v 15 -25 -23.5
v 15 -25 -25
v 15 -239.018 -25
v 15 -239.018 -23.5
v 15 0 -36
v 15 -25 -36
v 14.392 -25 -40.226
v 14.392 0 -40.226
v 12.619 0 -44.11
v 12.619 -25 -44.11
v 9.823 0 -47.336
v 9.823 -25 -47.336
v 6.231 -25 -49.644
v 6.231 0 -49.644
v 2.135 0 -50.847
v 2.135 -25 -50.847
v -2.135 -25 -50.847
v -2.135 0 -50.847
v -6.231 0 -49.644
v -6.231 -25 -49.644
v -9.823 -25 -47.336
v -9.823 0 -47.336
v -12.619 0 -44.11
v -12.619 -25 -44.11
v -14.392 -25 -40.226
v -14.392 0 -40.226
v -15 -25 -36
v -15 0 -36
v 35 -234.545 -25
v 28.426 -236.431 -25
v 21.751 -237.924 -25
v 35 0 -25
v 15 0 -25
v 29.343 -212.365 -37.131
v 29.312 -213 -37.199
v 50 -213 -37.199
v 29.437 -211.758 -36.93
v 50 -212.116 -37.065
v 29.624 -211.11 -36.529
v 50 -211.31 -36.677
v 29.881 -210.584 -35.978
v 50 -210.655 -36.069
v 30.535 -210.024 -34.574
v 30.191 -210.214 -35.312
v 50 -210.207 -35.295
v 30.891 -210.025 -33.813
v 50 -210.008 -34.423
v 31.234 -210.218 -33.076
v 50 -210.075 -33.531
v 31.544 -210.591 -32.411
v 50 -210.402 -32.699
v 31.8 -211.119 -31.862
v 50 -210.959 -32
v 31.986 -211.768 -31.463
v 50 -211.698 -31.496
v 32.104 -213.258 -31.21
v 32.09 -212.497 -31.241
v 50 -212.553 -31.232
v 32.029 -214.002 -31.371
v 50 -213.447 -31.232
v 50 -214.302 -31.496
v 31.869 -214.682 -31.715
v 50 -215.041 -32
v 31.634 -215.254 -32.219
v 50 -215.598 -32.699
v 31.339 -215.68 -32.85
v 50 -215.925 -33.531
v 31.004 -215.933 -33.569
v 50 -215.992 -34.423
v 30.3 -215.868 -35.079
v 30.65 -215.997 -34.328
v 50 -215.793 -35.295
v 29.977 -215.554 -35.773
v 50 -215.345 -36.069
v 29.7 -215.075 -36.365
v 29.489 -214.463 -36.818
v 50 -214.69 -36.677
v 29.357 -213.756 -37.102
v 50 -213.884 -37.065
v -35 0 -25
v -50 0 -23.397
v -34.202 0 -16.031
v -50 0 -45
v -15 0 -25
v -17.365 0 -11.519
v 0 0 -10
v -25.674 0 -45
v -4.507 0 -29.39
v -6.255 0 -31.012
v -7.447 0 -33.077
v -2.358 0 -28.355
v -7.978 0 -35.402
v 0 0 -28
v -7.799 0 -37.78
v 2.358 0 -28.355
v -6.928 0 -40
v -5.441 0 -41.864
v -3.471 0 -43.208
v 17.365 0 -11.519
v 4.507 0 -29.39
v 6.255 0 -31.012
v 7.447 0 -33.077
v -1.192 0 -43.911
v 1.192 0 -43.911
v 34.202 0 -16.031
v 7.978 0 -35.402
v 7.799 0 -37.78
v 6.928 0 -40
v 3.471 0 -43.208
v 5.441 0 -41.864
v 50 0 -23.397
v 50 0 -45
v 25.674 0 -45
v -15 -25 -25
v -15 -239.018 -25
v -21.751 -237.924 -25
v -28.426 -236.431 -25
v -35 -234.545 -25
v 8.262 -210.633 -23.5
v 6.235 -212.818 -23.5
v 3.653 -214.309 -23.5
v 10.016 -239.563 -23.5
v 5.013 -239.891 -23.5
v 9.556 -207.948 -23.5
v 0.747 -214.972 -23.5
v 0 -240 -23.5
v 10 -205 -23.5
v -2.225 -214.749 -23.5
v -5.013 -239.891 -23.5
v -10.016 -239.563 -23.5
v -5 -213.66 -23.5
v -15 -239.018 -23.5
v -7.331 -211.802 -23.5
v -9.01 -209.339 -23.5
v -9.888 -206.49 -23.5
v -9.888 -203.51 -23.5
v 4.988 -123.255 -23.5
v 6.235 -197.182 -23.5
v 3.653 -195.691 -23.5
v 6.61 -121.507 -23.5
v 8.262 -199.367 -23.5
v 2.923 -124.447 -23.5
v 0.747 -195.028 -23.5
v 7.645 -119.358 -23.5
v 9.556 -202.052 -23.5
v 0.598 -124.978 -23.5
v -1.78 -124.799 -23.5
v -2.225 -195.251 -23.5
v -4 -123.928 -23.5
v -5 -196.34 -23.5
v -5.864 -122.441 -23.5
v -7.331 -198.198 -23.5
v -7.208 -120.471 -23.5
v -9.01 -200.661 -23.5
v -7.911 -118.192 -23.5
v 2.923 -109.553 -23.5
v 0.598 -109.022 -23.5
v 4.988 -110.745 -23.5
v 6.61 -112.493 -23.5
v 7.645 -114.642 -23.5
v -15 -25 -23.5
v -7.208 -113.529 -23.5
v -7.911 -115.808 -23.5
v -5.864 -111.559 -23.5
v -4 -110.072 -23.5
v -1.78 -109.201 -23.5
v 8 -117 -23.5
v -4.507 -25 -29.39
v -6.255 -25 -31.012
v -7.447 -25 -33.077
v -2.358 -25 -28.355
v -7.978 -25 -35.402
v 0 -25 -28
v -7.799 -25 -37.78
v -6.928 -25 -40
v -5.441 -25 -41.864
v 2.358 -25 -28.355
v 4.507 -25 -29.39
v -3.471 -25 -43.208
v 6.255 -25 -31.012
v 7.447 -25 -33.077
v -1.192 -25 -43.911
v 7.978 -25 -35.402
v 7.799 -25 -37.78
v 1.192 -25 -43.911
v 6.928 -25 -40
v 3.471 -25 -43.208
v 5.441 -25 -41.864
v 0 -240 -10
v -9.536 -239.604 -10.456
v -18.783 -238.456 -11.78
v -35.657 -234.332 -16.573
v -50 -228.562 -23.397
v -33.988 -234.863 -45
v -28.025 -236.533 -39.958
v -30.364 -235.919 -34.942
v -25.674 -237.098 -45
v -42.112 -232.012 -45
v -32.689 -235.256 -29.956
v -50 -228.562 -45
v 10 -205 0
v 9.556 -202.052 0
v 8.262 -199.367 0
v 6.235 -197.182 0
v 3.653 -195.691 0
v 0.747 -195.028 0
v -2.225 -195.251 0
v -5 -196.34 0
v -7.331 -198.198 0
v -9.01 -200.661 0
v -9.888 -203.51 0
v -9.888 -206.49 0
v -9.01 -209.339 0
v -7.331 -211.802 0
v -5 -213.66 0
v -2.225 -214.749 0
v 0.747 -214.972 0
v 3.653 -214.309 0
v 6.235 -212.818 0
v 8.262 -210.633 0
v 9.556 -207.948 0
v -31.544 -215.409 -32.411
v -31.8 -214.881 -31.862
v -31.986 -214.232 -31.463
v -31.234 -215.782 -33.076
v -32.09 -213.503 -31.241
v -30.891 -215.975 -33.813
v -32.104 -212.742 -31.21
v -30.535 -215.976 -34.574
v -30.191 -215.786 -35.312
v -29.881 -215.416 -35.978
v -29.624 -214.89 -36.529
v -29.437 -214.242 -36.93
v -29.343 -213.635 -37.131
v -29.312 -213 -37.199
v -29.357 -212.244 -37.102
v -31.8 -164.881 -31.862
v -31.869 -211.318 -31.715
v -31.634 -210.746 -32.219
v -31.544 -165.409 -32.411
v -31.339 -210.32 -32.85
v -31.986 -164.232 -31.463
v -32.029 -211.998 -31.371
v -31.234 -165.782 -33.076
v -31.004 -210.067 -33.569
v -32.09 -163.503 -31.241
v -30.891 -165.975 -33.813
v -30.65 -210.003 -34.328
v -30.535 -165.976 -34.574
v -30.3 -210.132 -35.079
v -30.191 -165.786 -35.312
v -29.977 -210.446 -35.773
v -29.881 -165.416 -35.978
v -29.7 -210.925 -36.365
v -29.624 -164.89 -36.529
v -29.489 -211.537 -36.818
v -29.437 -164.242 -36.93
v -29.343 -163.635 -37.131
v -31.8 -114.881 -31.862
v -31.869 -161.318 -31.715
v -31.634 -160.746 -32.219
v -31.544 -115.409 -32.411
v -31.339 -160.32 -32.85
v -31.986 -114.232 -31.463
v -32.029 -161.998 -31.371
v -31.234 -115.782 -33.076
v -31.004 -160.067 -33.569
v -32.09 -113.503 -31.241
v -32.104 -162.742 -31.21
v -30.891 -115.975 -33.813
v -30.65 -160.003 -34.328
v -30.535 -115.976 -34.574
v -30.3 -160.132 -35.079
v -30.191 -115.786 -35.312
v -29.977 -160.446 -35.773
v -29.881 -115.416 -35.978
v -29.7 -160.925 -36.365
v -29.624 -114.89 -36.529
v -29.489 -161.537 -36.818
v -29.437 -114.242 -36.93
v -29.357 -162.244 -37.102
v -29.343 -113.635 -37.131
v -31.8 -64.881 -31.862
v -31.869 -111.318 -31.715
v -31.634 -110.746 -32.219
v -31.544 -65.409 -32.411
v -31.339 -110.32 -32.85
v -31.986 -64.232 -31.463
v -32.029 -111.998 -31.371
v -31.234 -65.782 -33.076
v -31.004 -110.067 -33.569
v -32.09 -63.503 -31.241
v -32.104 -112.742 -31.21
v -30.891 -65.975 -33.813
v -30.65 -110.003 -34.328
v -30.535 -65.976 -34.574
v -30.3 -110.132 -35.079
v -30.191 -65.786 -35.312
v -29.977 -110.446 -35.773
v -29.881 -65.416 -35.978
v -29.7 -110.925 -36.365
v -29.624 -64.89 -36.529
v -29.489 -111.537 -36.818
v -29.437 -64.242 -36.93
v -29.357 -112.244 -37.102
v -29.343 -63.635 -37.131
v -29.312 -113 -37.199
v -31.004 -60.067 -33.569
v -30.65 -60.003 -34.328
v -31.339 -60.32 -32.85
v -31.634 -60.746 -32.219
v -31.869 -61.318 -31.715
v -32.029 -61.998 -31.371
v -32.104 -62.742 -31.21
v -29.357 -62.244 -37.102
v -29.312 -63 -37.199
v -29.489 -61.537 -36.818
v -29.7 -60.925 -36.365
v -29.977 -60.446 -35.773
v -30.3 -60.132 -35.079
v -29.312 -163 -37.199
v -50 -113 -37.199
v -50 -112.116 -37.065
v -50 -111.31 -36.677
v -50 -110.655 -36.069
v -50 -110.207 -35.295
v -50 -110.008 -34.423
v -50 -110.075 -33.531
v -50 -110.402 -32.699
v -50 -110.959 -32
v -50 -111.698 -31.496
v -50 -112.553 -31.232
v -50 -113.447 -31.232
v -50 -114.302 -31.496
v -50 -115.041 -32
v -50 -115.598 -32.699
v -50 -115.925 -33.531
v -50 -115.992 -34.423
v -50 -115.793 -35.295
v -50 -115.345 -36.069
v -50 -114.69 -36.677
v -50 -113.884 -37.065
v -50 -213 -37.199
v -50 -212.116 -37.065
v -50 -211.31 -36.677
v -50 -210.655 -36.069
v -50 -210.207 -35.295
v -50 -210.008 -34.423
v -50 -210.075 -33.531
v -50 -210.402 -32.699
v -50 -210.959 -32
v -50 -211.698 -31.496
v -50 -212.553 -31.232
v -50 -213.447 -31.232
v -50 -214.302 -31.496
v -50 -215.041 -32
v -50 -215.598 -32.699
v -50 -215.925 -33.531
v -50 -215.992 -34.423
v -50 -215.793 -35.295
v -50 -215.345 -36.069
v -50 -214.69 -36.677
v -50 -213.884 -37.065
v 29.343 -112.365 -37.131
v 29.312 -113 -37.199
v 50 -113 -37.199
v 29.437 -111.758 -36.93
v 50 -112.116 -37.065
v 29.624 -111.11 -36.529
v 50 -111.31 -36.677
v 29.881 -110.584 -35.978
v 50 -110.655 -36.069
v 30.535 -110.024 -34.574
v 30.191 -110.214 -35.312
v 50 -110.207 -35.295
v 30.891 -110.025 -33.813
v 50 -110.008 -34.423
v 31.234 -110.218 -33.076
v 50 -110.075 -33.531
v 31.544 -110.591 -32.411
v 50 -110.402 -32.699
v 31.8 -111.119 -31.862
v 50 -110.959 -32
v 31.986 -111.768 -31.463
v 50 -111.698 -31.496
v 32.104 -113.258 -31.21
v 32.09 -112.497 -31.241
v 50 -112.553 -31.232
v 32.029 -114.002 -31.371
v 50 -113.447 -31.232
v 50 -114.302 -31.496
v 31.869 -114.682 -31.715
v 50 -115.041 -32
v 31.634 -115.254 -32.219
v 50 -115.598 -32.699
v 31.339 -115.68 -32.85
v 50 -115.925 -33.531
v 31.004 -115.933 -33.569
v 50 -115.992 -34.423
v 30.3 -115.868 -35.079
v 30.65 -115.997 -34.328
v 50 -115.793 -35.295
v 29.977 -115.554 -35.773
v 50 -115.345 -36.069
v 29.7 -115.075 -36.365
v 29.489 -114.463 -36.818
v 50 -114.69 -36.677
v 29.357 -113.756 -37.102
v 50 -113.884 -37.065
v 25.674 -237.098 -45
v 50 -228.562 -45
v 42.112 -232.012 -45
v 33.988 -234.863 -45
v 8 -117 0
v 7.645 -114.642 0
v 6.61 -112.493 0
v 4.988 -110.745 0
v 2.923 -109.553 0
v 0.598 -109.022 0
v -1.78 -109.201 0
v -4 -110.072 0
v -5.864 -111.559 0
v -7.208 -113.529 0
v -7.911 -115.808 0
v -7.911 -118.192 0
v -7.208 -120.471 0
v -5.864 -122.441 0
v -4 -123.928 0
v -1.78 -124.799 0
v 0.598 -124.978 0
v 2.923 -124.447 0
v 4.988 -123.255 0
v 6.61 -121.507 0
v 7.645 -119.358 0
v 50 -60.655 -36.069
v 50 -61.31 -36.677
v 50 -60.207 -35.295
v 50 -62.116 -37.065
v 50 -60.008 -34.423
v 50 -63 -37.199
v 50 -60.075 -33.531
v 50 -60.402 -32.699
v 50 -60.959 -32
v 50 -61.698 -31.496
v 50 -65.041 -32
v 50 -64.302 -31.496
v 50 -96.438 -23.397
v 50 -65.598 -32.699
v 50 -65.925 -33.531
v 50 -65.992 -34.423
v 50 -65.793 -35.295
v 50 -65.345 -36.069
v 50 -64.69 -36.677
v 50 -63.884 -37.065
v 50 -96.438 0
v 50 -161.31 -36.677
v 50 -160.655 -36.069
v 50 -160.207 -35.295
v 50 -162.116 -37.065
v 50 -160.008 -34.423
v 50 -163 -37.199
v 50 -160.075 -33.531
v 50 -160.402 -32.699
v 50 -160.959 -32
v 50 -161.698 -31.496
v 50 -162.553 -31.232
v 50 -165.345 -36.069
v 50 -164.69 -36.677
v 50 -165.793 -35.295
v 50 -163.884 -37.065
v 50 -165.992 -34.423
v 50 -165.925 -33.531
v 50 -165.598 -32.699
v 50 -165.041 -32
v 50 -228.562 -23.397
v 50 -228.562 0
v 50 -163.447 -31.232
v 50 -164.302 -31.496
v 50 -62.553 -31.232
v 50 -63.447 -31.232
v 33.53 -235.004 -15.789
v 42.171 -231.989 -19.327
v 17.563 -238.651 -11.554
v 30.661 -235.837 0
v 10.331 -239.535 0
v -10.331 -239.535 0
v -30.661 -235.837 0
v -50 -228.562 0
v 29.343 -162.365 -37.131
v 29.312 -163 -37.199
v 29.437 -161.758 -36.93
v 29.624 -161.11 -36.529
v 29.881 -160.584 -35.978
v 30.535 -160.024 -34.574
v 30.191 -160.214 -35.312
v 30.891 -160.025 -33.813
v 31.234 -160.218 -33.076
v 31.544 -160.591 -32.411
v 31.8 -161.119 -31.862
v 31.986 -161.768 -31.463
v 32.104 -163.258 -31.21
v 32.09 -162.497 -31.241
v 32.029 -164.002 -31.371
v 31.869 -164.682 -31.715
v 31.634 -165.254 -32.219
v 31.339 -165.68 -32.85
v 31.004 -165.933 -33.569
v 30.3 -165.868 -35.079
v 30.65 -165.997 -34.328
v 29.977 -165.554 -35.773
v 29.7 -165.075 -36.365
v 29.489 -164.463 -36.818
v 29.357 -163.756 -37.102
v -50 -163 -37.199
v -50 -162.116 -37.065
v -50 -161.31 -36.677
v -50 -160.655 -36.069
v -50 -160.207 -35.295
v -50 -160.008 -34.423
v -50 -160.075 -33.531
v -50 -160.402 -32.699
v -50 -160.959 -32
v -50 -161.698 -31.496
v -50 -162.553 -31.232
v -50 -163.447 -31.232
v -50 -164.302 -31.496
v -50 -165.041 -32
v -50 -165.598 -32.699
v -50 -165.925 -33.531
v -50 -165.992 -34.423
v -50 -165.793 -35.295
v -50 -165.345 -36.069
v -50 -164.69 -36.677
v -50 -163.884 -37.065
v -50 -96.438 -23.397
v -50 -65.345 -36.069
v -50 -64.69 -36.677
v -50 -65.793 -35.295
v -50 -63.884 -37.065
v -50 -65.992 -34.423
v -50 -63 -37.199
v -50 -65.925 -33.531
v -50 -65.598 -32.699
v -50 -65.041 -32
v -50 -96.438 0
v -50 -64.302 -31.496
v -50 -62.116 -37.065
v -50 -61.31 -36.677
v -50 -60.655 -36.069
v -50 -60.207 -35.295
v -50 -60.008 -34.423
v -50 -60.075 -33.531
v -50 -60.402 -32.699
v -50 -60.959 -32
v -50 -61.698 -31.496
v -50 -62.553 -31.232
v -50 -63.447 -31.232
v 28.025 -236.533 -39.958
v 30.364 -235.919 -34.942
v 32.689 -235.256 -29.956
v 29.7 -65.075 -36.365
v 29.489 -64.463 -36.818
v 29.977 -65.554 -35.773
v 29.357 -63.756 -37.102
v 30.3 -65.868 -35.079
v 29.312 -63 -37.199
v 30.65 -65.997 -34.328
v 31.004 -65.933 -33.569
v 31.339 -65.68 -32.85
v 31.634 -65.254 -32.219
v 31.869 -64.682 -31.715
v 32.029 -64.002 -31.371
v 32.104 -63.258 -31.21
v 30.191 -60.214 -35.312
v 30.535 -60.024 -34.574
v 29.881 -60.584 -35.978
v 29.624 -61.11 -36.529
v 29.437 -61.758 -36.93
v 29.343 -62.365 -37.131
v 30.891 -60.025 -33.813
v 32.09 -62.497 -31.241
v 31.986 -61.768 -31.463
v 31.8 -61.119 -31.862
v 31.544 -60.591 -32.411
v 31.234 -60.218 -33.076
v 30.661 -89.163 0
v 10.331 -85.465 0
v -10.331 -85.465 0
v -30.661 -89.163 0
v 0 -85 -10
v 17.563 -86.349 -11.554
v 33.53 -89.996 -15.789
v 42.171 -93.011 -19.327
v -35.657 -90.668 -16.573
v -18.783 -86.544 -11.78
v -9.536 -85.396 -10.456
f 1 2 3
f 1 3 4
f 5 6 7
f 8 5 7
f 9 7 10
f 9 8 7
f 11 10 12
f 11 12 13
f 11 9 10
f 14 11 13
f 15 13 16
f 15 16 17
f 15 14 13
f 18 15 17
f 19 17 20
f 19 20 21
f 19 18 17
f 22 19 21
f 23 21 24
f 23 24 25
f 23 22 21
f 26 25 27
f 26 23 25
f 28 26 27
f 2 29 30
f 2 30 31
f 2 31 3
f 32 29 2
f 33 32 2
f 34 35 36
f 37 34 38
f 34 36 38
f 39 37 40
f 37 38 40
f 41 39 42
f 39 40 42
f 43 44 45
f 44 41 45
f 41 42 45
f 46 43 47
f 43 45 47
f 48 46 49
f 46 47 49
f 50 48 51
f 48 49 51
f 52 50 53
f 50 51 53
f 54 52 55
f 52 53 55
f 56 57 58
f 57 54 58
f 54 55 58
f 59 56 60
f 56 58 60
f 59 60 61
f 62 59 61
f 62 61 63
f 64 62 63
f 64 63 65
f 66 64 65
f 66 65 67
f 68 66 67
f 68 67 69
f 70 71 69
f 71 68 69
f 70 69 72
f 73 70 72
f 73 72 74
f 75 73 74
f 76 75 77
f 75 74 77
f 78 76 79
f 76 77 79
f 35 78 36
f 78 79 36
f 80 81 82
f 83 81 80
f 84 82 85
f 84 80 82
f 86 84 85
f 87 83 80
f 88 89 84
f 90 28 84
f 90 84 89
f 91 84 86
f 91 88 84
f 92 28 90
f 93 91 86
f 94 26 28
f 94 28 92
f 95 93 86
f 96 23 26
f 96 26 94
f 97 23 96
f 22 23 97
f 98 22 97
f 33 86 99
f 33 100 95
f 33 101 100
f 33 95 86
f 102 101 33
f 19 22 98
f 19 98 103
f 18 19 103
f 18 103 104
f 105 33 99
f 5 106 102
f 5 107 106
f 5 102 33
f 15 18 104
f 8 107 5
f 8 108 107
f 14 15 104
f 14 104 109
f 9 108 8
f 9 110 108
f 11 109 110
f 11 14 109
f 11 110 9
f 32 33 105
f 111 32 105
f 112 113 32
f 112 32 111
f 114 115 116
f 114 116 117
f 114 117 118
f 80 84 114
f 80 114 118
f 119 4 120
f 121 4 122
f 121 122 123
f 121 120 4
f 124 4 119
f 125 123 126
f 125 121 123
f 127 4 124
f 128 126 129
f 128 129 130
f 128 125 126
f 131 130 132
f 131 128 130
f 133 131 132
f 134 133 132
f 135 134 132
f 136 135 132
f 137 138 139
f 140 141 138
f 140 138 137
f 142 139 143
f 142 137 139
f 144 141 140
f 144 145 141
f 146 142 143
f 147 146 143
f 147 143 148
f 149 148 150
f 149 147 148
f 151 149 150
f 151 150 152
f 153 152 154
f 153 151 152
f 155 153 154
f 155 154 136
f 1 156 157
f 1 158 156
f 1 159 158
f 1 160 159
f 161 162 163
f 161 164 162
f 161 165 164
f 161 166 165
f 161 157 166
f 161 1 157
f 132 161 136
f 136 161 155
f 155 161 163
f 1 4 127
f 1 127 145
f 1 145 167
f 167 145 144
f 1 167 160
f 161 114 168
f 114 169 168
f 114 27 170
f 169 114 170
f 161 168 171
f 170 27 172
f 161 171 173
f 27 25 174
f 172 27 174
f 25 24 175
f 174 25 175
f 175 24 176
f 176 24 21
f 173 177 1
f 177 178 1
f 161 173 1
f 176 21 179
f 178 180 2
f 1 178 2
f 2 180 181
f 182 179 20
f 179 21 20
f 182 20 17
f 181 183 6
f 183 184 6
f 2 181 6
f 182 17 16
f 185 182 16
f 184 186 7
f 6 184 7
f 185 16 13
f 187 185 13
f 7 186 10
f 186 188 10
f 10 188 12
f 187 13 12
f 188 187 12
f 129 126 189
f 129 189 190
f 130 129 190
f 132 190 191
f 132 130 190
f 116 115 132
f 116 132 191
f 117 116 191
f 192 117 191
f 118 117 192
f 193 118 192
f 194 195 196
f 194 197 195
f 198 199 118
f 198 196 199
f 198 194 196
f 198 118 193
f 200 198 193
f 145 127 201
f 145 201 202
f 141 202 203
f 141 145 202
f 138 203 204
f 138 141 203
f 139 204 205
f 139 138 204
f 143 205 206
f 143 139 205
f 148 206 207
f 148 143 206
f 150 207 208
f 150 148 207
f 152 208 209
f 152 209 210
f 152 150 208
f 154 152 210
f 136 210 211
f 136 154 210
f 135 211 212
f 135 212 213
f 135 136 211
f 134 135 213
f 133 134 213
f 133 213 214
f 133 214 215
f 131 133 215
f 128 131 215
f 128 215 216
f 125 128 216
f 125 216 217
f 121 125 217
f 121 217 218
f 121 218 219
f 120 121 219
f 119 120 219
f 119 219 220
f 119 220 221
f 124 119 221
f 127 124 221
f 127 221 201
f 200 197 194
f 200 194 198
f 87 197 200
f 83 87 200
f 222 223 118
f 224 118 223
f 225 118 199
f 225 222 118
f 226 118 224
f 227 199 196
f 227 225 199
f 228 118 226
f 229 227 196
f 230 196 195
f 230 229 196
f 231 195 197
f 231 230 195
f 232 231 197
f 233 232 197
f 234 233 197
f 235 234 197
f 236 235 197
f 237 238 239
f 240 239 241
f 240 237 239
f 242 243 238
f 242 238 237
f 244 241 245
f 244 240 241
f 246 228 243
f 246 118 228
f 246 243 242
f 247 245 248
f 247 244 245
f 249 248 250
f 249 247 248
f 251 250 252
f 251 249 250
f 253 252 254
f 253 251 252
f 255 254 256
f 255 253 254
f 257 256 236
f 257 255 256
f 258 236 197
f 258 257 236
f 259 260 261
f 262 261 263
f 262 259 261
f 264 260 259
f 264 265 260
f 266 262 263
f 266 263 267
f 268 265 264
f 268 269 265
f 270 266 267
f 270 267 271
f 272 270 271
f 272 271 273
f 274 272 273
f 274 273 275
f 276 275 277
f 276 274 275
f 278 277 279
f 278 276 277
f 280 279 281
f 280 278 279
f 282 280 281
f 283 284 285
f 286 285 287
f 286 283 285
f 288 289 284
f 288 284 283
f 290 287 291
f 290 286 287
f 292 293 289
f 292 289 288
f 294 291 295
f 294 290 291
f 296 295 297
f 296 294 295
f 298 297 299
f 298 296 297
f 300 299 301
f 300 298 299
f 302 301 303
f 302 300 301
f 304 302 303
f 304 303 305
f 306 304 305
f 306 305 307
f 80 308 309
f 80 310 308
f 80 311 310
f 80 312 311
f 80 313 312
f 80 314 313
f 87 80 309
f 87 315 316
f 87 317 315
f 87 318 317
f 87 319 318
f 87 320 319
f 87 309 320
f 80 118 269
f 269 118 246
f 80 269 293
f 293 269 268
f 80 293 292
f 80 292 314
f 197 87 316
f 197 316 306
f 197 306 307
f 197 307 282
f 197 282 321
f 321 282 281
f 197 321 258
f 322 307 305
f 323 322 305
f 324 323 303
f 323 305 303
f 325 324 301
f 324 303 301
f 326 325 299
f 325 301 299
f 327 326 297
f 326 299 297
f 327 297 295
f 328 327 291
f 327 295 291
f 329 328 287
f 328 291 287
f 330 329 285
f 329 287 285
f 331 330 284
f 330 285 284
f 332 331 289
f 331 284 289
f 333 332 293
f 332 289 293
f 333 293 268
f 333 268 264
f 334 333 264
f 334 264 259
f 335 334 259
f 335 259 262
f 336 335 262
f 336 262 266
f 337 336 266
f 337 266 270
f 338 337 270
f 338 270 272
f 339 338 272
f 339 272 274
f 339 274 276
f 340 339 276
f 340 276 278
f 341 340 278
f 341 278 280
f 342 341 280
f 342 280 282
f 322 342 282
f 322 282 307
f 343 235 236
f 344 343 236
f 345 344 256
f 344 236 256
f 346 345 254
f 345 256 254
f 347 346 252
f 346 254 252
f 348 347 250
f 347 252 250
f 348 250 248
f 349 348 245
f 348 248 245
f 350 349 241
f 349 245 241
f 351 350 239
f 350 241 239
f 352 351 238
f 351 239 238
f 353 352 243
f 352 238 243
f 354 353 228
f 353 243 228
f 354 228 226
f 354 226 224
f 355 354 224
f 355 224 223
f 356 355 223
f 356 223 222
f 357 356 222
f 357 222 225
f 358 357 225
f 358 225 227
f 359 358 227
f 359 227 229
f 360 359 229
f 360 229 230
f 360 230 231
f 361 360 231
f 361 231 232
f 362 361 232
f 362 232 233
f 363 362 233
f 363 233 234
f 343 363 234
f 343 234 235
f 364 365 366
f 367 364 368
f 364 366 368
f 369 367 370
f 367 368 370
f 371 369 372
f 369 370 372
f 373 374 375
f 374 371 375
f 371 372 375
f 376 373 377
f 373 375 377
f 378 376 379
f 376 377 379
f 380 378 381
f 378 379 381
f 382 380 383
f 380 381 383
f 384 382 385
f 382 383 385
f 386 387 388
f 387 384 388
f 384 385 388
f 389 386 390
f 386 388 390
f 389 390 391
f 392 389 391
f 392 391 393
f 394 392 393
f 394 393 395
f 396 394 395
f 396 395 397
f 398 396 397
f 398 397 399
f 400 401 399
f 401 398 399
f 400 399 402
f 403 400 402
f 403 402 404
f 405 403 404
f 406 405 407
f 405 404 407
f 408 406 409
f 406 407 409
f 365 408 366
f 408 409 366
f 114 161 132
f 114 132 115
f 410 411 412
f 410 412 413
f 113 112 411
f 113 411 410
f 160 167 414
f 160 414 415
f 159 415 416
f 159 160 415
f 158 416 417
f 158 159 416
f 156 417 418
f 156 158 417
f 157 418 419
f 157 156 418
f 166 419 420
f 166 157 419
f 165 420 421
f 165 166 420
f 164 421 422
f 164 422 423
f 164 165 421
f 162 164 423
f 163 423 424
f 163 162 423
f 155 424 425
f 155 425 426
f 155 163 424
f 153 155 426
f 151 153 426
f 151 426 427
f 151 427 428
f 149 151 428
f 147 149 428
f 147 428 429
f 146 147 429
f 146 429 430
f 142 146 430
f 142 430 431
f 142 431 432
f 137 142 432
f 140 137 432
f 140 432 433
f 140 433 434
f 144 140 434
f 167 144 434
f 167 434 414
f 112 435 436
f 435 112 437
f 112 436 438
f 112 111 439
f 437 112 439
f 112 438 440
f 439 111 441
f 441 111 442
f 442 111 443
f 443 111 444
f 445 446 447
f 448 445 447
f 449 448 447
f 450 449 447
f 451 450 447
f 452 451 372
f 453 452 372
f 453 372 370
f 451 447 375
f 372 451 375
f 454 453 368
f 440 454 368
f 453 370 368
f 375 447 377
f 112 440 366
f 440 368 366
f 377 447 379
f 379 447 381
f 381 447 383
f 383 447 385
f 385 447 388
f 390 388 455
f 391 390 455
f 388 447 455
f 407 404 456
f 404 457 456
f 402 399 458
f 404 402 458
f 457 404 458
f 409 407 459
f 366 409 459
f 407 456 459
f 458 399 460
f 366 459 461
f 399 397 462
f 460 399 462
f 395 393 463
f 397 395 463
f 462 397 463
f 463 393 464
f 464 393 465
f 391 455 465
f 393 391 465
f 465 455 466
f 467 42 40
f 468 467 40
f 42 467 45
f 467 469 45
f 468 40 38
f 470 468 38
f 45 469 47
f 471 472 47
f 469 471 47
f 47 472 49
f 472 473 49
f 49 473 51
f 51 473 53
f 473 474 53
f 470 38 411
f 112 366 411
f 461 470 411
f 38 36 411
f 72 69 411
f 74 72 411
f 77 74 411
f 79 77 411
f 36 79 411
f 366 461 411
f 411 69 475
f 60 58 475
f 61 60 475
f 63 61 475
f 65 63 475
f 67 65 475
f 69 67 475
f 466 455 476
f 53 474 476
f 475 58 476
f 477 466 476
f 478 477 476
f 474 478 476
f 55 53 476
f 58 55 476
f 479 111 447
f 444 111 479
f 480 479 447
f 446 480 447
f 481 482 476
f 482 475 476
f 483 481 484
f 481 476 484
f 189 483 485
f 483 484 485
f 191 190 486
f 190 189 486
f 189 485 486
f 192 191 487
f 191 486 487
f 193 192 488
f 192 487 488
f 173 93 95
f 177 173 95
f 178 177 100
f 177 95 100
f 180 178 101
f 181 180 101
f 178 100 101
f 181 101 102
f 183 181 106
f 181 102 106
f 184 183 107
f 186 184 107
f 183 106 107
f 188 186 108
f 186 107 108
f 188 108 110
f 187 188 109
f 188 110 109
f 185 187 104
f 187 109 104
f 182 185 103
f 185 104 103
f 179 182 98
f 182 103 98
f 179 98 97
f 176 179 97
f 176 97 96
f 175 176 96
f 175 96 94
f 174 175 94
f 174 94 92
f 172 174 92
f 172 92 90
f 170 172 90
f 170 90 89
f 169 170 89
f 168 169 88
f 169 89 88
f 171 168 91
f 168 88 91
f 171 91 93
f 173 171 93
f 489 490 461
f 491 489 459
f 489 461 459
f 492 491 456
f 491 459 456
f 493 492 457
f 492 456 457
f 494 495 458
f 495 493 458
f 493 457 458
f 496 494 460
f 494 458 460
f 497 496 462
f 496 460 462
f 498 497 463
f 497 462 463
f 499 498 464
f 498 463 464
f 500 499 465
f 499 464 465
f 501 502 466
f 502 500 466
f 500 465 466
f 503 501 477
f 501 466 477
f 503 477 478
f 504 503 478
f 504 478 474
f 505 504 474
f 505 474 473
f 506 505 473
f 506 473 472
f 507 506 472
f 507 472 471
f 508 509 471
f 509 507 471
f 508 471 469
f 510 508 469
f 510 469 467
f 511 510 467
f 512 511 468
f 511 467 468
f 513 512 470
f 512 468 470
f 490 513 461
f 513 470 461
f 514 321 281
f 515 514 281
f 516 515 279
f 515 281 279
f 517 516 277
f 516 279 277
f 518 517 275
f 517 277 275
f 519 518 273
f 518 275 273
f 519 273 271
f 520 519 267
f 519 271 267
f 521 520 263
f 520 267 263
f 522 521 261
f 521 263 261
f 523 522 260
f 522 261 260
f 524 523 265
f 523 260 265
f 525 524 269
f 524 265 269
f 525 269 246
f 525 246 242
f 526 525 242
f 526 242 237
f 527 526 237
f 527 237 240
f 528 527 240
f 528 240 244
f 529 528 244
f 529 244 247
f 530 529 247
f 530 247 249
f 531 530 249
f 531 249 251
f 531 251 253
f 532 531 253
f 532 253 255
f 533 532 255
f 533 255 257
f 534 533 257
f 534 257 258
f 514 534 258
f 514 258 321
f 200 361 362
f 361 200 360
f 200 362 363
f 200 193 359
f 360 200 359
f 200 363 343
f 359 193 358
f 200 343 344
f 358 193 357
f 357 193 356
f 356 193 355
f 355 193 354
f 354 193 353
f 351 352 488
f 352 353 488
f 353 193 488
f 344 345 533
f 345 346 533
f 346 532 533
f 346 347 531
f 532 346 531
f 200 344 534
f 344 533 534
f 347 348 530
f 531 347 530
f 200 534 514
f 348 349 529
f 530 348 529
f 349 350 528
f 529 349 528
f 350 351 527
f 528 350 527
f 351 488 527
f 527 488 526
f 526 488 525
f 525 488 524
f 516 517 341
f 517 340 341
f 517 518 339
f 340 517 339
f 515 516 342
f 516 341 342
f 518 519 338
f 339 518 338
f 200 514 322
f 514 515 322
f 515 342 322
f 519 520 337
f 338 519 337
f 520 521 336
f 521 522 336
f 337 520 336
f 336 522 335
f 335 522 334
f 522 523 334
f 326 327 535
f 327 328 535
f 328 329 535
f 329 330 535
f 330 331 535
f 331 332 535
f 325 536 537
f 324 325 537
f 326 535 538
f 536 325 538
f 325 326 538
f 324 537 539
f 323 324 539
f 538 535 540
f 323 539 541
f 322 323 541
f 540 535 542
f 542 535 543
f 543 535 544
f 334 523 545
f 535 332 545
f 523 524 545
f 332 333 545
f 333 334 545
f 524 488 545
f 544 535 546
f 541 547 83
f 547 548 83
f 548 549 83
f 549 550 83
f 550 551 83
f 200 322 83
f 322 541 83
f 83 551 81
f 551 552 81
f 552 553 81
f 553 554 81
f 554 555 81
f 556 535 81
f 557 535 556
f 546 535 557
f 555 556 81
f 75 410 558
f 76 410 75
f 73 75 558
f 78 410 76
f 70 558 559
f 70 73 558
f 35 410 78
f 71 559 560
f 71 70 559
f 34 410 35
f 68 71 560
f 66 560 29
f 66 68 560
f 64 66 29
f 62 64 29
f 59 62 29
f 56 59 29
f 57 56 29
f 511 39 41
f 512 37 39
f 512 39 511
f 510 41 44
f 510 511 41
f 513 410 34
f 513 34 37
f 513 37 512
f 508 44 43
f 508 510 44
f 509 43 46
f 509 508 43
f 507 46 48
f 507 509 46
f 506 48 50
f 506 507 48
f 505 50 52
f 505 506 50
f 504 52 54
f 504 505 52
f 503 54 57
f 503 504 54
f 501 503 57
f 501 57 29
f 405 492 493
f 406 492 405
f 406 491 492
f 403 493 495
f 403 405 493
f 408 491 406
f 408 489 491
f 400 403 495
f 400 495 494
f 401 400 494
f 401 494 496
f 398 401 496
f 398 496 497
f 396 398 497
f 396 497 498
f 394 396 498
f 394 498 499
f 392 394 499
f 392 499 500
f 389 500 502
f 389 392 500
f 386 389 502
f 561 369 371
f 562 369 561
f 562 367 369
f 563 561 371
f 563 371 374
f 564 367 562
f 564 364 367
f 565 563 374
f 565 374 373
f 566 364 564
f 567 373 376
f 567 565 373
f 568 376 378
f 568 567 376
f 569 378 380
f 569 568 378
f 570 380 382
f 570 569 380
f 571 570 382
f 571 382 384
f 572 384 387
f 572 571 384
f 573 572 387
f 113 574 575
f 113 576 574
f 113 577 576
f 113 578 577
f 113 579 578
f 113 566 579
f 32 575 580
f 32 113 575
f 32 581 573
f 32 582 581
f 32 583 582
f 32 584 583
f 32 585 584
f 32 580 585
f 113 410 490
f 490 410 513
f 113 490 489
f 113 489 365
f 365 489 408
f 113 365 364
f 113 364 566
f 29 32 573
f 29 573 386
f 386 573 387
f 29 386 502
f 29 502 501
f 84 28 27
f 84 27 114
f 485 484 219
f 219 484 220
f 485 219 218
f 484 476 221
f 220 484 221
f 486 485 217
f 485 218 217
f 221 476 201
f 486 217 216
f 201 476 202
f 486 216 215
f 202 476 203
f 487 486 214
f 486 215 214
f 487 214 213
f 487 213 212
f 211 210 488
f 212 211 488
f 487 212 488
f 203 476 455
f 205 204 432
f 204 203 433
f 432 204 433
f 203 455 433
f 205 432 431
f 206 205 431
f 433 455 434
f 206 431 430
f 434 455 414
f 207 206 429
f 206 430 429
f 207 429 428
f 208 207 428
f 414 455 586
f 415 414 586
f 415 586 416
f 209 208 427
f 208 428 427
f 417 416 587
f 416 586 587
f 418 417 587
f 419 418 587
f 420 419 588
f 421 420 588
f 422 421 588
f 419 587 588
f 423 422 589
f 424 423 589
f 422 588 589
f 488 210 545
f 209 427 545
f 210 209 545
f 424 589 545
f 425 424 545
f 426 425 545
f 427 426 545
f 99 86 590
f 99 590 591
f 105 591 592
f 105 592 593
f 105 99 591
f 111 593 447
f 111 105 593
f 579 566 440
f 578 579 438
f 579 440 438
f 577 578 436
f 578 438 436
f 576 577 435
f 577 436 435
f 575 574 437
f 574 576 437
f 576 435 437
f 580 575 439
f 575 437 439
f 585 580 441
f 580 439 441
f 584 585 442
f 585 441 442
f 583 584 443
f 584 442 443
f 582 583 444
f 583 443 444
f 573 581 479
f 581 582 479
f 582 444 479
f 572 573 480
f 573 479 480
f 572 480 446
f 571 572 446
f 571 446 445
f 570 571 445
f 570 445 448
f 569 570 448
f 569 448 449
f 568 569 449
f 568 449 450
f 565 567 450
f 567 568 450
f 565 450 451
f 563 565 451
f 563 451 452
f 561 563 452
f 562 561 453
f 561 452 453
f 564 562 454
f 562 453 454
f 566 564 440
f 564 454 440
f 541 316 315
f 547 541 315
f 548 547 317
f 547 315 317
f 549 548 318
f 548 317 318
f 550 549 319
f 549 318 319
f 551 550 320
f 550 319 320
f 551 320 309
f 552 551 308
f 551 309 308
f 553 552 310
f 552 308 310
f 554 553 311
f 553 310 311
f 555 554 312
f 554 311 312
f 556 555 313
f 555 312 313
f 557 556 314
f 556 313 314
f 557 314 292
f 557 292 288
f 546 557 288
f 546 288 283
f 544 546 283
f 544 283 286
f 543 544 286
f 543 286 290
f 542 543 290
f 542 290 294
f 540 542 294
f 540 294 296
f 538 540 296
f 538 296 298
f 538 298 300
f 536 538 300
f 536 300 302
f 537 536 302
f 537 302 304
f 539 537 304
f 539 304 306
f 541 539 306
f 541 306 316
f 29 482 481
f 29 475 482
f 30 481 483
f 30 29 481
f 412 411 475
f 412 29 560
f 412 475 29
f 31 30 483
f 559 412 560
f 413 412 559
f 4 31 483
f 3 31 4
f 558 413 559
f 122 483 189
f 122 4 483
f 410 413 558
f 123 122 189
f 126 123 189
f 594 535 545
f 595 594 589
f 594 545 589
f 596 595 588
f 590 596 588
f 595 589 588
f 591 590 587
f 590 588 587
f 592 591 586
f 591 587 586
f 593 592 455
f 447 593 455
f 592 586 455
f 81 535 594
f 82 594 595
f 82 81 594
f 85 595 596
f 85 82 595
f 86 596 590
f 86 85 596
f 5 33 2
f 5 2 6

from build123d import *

# Parameters (mm, degrees)
SKETCH1_R           = 8
BOSS_EXTRUDE1_DEPTH = 25
BOSS_EXTRUDE2_DEPTH = 240
BOSS_EXTRUDE3_REACH = 252.402
SKETCH3_R           = 8
SKETCH3_R_2         = 10
CUT_EXTRUDE1_DEPTH  = 251.401677426
SKETCH4_R           = 3
CUT_EXTRUDE2_DEPTH  = 265.954713149


with BuildPart() as part:
    # Sketch1 → Boss-Extrude1 (new body)
    with BuildSketch(Plane(origin=(0, 0, 0), x_dir=(1, 0, 0), z_dir=(0, 1, 0))):
        with BuildLine():
            Line((-15, 36), (-15, 25))
            Line((-15, 25), (-15, 23.5))
            Line((-15, 23.5), (15, 23.5))
            Line((15, 23.5), (15, 25))
            Line((15, 25), (15, 36))
            ThreePointArc((15, 36), (0, 51), (-15, 36))
        make_face()
        with Locations((0, 36)):
            Circle(SKETCH1_R, mode=Mode.SUBTRACT)
    extrude(amount=-BOSS_EXTRUDE1_DEPTH)

    # Sketch1<3> → Boss-Extrude2 (add)
    with BuildSketch(Plane(origin=(0, 0, 0), x_dir=(1, 0, 0), z_dir=(0, 1, 0))):
        with BuildLine():
            Line((-50, 45), (-50, 23.397459622))
            ThreePointArc((-50, 23.397459622), (0, 10), (50, 23.397459622))
            Line((50, 23.397459622), (50, 45))
            Line((50, 45), (25.673846837, 45))
            Line((25.673846837, 45), (35, 25))
            Line((35, 25), (15, 25))
            Line((15, 25), (15, 23.5))
            Line((15, 23.5), (-15, 23.5))
            Line((-15, 23.5), (-15, 25))
            Line((-15, 25), (-35, 25))
            Line((-35, 25), (-25.673846837, 45))
            Line((-25.673846837, 45), (-50, 45))
        make_face()
    extrude(amount=-BOSS_EXTRUDE2_DEPTH)

    # Sketch2 → Boss-Extrude3 (add, up to next)
    with BuildSketch(Plane.XY, mode=Mode.PRIVATE) as boss_extrude3_sk1:
        with BuildLine():
            Line((50, -96.438424114), (50, -228.561575886))
            ThreePointArc((50, -228.561575886), (0, -240), (-50, -228.561575886))
            Line((-50, -228.561575886), (-50, -96.438424114))
            ThreePointArc((-50, -96.438424114), (0, -85), (50, -96.438424114))
        make_face()
    boss_extrude3_tool1 = extrude(boss_extrude3_sk1.sketch, amount=-BOSS_EXTRUDE3_REACH, mode=Mode.PRIVATE) - part.part
    add(boss_extrude3_tool1.solids().sort_by_distance((0, -162.5, 0))[0])

    # Sketch3 → Cut-Extrude1 (cut, through all)
    with BuildSketch(Plane.XY):
        with BuildLine():
            ThreePointArc((0, -240), (-25.645845405, -237.103927734), (-50, -228.561575886))
            Line((-50, -228.561575886), (-50, -240))
            Line((-50, -240), (0, -240))
        make_face()
        with BuildLine():
            ThreePointArc((50, -228.561575886), (25.645845405, -237.103927734), (0, -240))
            Line((0, -240), (50, -240))
            Line((50, -240), (50, -228.561575886))
        make_face()
        with Locations((0, -117)):
            Circle(SKETCH3_R)
        with Locations((0, -205)):
            Circle(SKETCH3_R_2)
    extrude(amount=-CUT_EXTRUDE1_DEPTH, mode=Mode.SUBTRACT)

    # Sketch4 → Cut-Extrude2 (cut, through all)
    with BuildSketch(Plane(origin=(50, 0, 0), x_dir=(0, 0, -1), z_dir=(1, 0, 0))):
        with Locations((34.198729811, -63)):
            Circle(SKETCH4_R)
        with Locations((34.198729811, -113)):
            Circle(SKETCH4_R)
        with Locations((34.198729811, -163)):
            Circle(SKETCH4_R)
        with Locations((34.198729811, -213)):
            Circle(SKETCH4_R)
    extrude(amount=-CUT_EXTRUDE2_DEPTH, mode=Mode.SUBTRACT)


solid = part.part
